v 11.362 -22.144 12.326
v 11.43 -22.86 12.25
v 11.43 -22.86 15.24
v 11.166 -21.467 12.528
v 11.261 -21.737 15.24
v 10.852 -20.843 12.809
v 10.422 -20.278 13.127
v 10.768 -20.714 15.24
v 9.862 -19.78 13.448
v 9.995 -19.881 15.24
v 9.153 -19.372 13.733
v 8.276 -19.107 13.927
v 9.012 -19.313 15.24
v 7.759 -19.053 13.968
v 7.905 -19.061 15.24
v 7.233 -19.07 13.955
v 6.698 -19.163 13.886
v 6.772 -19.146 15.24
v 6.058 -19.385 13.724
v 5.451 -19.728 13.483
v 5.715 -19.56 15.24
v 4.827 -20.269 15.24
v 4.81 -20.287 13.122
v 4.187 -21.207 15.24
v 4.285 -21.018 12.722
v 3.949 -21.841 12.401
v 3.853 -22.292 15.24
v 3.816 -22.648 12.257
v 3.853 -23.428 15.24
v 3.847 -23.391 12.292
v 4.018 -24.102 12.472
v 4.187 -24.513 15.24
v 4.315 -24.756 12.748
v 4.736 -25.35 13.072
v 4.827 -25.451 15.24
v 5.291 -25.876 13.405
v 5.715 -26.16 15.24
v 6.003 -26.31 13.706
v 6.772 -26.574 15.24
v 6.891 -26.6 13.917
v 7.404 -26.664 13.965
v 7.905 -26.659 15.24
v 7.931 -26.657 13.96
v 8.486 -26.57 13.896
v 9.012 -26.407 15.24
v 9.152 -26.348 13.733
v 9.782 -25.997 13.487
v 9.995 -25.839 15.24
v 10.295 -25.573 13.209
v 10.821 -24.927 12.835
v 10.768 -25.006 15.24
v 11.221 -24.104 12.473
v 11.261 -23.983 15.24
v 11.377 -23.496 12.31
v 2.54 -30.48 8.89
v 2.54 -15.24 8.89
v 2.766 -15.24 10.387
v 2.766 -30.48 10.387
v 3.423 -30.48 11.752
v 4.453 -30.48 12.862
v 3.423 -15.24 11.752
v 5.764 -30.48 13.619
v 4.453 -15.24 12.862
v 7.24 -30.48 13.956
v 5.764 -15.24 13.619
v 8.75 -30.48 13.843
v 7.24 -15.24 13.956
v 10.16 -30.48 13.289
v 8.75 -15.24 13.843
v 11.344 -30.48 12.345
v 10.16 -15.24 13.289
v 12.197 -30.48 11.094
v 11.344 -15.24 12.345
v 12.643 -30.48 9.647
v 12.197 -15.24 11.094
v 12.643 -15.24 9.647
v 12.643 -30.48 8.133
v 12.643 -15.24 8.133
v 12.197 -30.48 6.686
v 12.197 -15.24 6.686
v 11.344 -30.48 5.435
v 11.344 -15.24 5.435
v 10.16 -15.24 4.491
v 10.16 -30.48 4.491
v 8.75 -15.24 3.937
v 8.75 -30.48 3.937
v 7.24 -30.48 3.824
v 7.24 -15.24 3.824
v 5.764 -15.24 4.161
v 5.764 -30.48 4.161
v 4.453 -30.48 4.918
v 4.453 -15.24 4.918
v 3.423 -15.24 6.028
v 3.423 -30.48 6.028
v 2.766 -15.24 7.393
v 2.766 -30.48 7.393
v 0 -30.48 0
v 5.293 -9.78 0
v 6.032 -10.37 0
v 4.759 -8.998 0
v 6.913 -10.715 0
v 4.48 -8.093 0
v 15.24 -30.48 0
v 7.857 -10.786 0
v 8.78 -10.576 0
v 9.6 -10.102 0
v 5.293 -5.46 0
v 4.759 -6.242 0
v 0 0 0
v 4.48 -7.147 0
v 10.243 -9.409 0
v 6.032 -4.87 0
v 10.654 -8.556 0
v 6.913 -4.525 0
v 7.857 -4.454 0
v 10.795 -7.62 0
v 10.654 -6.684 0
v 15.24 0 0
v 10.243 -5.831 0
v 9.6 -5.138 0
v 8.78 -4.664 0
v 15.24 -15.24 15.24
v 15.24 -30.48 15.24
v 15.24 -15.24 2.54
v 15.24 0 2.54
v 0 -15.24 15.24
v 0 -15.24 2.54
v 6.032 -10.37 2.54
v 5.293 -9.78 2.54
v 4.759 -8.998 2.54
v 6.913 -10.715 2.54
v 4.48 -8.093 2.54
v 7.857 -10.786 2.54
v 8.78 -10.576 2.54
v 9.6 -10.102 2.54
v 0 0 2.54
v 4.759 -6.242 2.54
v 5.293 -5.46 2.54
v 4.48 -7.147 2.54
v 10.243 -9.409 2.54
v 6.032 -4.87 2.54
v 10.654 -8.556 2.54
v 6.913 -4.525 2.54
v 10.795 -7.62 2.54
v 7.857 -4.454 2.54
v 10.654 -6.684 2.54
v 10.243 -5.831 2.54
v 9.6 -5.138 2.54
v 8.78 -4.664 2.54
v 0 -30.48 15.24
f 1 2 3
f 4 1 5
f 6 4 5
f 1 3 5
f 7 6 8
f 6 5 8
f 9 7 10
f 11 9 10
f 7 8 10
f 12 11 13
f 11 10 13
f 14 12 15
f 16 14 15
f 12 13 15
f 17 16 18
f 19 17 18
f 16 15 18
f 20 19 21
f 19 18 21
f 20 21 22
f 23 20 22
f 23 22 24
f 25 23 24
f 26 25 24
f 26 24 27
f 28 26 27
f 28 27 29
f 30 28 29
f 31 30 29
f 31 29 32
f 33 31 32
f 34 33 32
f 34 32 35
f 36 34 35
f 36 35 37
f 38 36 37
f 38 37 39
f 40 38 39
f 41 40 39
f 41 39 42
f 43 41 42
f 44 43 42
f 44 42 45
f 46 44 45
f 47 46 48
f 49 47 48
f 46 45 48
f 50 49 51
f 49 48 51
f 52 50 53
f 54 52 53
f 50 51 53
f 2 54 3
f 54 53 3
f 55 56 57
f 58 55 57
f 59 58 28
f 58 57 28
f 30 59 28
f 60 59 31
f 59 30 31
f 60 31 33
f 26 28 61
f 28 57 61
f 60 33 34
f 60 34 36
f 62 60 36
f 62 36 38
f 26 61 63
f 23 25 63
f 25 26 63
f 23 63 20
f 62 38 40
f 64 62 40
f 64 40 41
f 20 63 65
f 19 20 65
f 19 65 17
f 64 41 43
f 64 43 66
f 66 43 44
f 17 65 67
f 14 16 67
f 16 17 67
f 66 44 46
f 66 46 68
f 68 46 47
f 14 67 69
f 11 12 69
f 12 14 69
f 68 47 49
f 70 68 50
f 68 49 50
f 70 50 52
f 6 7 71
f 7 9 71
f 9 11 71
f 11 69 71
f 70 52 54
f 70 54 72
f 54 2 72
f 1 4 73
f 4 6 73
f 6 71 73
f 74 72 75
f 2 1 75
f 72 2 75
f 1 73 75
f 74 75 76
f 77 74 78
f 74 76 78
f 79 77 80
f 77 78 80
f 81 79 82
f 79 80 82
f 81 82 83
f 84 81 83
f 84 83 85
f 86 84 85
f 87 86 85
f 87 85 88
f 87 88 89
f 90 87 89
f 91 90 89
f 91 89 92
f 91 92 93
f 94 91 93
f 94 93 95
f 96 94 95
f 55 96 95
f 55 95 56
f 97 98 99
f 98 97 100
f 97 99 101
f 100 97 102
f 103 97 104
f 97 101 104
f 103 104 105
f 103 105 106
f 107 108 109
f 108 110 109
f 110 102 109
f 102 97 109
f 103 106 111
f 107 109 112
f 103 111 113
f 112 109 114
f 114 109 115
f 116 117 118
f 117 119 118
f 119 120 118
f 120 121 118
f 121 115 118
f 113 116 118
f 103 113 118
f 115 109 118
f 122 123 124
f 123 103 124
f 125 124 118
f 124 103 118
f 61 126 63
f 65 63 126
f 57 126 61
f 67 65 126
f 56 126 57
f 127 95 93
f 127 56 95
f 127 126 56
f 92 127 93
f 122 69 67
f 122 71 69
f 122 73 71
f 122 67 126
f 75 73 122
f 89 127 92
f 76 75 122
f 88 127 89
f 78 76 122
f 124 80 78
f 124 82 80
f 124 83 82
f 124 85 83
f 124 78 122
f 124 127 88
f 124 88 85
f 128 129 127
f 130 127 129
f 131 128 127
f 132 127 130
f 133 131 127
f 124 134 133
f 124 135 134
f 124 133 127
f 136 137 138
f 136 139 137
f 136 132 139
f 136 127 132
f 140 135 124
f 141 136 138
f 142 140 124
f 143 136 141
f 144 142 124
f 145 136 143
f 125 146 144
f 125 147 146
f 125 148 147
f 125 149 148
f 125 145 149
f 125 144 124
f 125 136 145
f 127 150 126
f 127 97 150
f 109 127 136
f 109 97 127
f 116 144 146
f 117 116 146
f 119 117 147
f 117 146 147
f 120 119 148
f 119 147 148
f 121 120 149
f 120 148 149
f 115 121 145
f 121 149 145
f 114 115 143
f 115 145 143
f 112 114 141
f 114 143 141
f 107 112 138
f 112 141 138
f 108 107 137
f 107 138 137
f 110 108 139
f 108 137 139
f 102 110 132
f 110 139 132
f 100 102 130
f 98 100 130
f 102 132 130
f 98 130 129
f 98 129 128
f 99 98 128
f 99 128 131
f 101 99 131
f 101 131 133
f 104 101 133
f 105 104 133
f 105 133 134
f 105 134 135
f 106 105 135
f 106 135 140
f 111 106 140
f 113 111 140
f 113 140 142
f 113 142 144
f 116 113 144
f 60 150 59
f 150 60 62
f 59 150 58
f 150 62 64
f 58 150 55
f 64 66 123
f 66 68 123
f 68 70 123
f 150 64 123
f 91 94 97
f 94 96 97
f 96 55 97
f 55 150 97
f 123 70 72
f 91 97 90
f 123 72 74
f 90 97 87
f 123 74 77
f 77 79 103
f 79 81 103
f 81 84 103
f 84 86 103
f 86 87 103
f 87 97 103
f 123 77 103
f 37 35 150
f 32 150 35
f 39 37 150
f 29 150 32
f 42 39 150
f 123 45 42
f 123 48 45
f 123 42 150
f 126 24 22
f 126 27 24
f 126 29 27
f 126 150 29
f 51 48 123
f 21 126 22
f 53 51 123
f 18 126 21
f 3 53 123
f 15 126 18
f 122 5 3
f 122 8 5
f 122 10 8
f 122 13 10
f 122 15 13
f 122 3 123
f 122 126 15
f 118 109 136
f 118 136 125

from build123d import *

# Parameters (mm, degrees)
F0_W     = 15.24
F0_H     = 30.48
F1_DEPTH = 2.54
F2_W     = 15.24
F2_H     = 15.24
F3_DEPTH = 12.7
F4_R     = 3.175
F5_DEPTH = 25.4
F6_R     = 5.08
F7_DEPTH = 25.4
F8_R     = 3.81
F9_DEPTH = 3.556


with BuildPart() as f1:
    # F0 (on Top) → F1 (new body)
    with BuildSketch(Plane.XY):
        with Locations((7.62, -15.24)):
            Rectangle(F0_W, F0_H)
    extrude(amount=F1_DEPTH)

    # F2 (on face) → F3 (join)
    with BuildSketch(Plane.XY.offset(2.54)):
        with Locations((7.62, -22.86)):
            Rectangle(F2_W, F2_H)
    extrude(amount=F3_DEPTH)

    # F4 (on face) → F5 (cut)
    with BuildSketch(Plane.XY.offset(2.54)):
        with Locations((7.62, -7.62)):
            Circle(F4_R)
    extrude(amount=-F5_DEPTH, mode=Mode.SUBTRACT)

    # F6 (on face) → F7 (cut)
    with BuildSketch(Plane(origin=(0, -15.24, 0), x_dir=(-1, 0, 0), z_dir=(0, 1, 0))):
        with Locations((-7.62, 8.89)):
            Circle(F6_R)
    extrude(amount=-F7_DEPTH, mode=Mode.SUBTRACT)

    # F8 (on face) → F9 (cut)
    with BuildSketch(Plane.XY.offset(15.24)):
        with Locations((7.62, -22.86)):
            Circle(F8_R)
    extrude(amount=-F9_DEPTH, mode=Mode.SUBTRACT)


solid = f1.part
